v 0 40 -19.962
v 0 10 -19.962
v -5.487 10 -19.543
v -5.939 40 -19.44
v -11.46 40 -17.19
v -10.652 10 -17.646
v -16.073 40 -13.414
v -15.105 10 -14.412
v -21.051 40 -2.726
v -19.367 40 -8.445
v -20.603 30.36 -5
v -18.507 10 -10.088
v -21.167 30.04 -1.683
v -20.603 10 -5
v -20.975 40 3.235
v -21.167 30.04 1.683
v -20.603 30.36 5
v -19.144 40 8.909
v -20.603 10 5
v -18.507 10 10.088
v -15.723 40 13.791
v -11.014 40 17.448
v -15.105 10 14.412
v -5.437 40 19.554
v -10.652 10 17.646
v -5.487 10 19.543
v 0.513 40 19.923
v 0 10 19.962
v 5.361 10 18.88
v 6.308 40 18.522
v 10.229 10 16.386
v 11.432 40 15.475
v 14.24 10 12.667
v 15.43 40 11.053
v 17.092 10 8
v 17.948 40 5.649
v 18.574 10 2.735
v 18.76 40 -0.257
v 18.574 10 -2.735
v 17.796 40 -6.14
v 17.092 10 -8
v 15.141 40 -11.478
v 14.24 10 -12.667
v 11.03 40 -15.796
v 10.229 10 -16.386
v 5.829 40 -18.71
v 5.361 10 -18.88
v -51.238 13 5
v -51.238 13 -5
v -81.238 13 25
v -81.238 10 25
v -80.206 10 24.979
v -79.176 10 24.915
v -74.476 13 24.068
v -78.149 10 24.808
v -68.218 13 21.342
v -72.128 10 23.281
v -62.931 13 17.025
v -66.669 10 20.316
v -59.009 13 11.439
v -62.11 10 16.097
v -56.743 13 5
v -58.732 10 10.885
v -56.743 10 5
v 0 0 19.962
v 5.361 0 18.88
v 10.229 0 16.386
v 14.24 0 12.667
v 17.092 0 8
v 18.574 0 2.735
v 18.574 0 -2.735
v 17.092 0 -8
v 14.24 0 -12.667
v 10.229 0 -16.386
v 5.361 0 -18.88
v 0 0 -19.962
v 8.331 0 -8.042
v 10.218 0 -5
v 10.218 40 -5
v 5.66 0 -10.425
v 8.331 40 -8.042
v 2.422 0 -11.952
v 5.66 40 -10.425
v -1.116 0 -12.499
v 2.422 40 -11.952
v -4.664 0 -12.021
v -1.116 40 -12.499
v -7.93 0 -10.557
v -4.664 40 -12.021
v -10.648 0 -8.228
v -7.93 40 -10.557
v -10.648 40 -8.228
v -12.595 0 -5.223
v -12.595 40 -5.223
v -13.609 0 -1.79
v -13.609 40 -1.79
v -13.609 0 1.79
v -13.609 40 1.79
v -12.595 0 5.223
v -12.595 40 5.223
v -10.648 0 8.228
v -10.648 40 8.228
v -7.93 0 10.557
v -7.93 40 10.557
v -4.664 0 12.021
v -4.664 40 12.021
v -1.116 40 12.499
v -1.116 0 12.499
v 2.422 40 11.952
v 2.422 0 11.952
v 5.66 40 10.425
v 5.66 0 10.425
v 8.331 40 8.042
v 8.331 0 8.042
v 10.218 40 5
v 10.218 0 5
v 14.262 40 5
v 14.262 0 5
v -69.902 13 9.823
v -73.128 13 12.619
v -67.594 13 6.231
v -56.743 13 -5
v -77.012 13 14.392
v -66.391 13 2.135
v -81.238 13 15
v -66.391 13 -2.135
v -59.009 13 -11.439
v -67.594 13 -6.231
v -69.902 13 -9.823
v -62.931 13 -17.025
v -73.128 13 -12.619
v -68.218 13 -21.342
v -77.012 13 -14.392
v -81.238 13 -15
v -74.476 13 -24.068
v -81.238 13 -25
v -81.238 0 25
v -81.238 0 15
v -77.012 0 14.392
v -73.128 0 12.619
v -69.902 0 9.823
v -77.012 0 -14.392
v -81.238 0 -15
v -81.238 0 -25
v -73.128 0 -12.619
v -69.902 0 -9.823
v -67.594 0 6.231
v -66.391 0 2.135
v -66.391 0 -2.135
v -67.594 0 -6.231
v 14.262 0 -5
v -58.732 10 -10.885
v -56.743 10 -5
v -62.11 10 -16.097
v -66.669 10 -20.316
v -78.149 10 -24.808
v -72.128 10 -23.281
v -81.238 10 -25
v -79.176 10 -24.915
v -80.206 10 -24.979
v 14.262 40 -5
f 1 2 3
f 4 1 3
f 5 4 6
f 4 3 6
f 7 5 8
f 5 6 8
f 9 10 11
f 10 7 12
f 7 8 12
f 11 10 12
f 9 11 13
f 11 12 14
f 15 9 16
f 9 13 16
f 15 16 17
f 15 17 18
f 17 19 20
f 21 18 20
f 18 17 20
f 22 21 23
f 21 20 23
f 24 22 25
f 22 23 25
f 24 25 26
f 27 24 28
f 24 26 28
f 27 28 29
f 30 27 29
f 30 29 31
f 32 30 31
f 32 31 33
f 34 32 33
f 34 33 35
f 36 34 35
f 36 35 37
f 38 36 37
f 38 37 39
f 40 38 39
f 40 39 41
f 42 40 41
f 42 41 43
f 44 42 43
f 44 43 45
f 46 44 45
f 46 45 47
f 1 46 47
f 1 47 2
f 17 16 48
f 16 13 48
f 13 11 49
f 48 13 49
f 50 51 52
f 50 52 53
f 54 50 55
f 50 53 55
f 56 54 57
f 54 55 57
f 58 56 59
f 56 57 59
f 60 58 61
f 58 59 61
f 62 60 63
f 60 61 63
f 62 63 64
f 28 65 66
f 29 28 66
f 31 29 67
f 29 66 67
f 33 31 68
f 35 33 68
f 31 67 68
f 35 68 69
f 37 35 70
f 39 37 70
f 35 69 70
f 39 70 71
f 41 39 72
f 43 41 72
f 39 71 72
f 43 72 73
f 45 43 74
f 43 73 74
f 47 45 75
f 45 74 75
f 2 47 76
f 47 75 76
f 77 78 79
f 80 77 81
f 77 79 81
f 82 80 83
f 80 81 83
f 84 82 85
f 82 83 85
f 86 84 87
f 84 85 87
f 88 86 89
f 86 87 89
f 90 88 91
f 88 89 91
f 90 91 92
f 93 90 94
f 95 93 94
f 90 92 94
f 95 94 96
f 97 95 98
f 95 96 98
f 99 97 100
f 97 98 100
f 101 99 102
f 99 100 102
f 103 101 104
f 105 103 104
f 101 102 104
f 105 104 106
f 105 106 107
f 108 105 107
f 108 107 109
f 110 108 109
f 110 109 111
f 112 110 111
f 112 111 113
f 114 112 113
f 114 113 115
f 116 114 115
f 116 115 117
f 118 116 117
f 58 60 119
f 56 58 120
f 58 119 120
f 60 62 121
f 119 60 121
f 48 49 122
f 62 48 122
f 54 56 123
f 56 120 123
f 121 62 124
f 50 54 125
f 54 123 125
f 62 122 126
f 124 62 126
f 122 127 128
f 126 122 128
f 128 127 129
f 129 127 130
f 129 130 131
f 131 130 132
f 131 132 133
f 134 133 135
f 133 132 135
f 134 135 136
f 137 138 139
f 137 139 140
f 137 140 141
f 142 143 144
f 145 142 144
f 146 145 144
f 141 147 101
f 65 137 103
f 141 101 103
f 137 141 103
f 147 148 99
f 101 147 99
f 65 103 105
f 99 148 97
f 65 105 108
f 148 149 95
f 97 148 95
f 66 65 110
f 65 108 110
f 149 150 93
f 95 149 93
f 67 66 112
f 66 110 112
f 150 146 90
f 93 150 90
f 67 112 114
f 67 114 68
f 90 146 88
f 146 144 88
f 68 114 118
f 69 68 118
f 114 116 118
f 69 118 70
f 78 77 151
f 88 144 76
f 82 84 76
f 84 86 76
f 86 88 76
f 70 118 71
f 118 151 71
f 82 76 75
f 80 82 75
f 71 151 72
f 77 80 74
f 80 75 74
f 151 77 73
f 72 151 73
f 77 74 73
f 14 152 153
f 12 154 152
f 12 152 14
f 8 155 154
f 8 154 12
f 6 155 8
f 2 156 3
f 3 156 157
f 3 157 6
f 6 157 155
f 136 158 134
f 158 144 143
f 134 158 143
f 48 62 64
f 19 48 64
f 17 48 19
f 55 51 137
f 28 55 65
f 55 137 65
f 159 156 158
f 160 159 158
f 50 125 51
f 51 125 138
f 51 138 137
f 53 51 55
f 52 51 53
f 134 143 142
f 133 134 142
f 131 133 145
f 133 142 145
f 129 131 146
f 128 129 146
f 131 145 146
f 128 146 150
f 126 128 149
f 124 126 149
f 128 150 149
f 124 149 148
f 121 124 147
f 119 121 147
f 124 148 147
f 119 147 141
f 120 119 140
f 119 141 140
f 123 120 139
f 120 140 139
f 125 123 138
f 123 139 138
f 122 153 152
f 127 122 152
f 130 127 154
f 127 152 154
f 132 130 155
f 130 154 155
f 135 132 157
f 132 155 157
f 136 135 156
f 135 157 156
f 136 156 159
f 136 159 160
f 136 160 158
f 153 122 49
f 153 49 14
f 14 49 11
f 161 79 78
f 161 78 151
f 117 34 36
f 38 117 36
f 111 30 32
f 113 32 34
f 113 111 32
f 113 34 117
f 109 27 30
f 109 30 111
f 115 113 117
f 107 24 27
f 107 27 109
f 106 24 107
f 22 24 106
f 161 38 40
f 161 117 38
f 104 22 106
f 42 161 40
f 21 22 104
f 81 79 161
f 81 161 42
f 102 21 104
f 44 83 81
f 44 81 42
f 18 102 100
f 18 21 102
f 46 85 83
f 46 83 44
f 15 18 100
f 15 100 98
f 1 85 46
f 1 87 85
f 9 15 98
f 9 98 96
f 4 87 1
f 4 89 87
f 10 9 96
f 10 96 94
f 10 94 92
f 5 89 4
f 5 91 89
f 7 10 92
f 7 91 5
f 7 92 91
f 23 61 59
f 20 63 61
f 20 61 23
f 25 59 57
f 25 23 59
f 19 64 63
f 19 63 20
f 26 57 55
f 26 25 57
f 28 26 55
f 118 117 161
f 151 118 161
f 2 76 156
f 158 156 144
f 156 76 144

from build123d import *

# Parameters (mm, degrees)
EXTRUDE_3_DEPTH          = 10
EXTRUDE_7_DEPTH          = 3
CUT_EXTRUDE_3_DEPTH      = 86.986132552
CUT_EXTRUDE_3_DEPTH_BACK = 86.986132552
SKETCH_7_R               = 20
EXTRUDE_8_DEPTH          = 30
RIB_START                = -5
RIB_1_DEPTH              = 10
SKETCH_10_R              = 12.5
CUT_EXTRUDE_4_DEPTH      = 94.939421923
SKETCH_11_W              = 15.5
SKETCH_11_H              = 10
CUT_EXTRUDE_5_DEPTH      = 94.939421923


# Read off the part's stored shape, not the designer's step: 筋1
with BuildPart() as part:
    # 草图1 → 凸台-拉伸3 (new body)
    with BuildSketch(Plane(origin=(0, 0, 0), x_dir=(1, 0, 0), z_dir=(0, 1, 0))):
        with BuildLine():
            Line((-81.238014447, 25), (-81.238014447, -25))
            Line((-81.238014447, -25), (0, -19.96164623))
            ThreePointArc((0, -19.96164623), (18.761985553, 0), (0, 19.96164623))
            Line((0, 19.96164623), (-81.238014447, 25))
        make_face()
    extrude(amount=EXTRUDE_3_DEPTH)

    # 草图2 → 凸台-拉伸7 (add)
    with BuildSketch(Plane(origin=(0, 10, 0), x_dir=(1, 0, 0), z_dir=(0, 1, 0))):
        with BuildLine():
            Line((-81.238014447, 25), (-81.238014447, -25))
            ThreePointArc((-81.238014447, -25), (-56.238014447, 0), (-81.238014447, 25))
        make_face()
    extrude(amount=EXTRUDE_7_DEPTH)

    # 草图5 → 切除-拉伸3 (cut, two sides: drawn at the far end of the back side and taken through both)
    with BuildSketch(Plane(origin=(0, 13, 0), x_dir=(1, 0, 0), z_dir=(0, 1, 0)).offset(-CUT_EXTRUDE_3_DEPTH_BACK)):
        with BuildLine():
            Line((-306.644606732, 15), (-81.238014447, 15))
            ThreePointArc((-81.238014447, 15), (-66.238014447, 0), (-81.238014447, -15))
            Line((-81.238014447, -15), (-306.644606732, -15))
            Line((-306.644606732, -15), (-757.457791303, -15))
            Line((-757.457791303, -15), (-757.457791303, 15))
            Line((-757.457791303, 15), (-306.644606732, 15))
        make_face()
    extrude(amount=CUT_EXTRUDE_3_DEPTH + CUT_EXTRUDE_3_DEPTH_BACK, mode=Mode.SUBTRACT)

    # 草图7 → 凸台-拉伸8 (add)
    with BuildSketch(Plane(origin=(0, 10, 0), x_dir=(1, 0, 0), z_dir=(0, 1, 0))):
        with Locations(Location((-1.238014447, 0, 0), (0, 0, 86.451080997))):
            Circle(SKETCH_7_R)
    extrude(amount=EXTRUDE_8_DEPTH)

    # 筋1 outline → 筋1 (add)
    with BuildSketch(Plane.XY.offset(RIB_START)):
        Polygon((-51.238014447, 13), (-58, 13), (-58, 10), (-19, 10), (-19, 31.268208187), (-20.602931178, 30.359880519), align=None)
    extrude(amount=RIB_1_DEPTH)

    # 草图10 → 切除-拉伸4 (cut, through all)
    with BuildSketch(Plane(origin=(0, 40, 0), x_dir=(1, 0, 0), z_dir=(0, 1, 0))):
        with Locations(Location((-1.238014447, 0, 0), (0, 0, 270))):
            Circle(SKETCH_10_R)
    extrude(amount=-CUT_EXTRUDE_4_DEPTH, mode=Mode.SUBTRACT)

    # 草图11 → 切除-拉伸5 (cut, through all)
    with BuildSketch(Plane(origin=(0, 40, 0), x_dir=(1, 0, 0), z_dir=(0, 1, 0))):
        with Locations((6.511985553, 0)):
            Rectangle(SKETCH_11_W, SKETCH_11_H)
    extrude(amount=-CUT_EXTRUDE_5_DEPTH, mode=Mode.SUBTRACT)


solid = part.part
